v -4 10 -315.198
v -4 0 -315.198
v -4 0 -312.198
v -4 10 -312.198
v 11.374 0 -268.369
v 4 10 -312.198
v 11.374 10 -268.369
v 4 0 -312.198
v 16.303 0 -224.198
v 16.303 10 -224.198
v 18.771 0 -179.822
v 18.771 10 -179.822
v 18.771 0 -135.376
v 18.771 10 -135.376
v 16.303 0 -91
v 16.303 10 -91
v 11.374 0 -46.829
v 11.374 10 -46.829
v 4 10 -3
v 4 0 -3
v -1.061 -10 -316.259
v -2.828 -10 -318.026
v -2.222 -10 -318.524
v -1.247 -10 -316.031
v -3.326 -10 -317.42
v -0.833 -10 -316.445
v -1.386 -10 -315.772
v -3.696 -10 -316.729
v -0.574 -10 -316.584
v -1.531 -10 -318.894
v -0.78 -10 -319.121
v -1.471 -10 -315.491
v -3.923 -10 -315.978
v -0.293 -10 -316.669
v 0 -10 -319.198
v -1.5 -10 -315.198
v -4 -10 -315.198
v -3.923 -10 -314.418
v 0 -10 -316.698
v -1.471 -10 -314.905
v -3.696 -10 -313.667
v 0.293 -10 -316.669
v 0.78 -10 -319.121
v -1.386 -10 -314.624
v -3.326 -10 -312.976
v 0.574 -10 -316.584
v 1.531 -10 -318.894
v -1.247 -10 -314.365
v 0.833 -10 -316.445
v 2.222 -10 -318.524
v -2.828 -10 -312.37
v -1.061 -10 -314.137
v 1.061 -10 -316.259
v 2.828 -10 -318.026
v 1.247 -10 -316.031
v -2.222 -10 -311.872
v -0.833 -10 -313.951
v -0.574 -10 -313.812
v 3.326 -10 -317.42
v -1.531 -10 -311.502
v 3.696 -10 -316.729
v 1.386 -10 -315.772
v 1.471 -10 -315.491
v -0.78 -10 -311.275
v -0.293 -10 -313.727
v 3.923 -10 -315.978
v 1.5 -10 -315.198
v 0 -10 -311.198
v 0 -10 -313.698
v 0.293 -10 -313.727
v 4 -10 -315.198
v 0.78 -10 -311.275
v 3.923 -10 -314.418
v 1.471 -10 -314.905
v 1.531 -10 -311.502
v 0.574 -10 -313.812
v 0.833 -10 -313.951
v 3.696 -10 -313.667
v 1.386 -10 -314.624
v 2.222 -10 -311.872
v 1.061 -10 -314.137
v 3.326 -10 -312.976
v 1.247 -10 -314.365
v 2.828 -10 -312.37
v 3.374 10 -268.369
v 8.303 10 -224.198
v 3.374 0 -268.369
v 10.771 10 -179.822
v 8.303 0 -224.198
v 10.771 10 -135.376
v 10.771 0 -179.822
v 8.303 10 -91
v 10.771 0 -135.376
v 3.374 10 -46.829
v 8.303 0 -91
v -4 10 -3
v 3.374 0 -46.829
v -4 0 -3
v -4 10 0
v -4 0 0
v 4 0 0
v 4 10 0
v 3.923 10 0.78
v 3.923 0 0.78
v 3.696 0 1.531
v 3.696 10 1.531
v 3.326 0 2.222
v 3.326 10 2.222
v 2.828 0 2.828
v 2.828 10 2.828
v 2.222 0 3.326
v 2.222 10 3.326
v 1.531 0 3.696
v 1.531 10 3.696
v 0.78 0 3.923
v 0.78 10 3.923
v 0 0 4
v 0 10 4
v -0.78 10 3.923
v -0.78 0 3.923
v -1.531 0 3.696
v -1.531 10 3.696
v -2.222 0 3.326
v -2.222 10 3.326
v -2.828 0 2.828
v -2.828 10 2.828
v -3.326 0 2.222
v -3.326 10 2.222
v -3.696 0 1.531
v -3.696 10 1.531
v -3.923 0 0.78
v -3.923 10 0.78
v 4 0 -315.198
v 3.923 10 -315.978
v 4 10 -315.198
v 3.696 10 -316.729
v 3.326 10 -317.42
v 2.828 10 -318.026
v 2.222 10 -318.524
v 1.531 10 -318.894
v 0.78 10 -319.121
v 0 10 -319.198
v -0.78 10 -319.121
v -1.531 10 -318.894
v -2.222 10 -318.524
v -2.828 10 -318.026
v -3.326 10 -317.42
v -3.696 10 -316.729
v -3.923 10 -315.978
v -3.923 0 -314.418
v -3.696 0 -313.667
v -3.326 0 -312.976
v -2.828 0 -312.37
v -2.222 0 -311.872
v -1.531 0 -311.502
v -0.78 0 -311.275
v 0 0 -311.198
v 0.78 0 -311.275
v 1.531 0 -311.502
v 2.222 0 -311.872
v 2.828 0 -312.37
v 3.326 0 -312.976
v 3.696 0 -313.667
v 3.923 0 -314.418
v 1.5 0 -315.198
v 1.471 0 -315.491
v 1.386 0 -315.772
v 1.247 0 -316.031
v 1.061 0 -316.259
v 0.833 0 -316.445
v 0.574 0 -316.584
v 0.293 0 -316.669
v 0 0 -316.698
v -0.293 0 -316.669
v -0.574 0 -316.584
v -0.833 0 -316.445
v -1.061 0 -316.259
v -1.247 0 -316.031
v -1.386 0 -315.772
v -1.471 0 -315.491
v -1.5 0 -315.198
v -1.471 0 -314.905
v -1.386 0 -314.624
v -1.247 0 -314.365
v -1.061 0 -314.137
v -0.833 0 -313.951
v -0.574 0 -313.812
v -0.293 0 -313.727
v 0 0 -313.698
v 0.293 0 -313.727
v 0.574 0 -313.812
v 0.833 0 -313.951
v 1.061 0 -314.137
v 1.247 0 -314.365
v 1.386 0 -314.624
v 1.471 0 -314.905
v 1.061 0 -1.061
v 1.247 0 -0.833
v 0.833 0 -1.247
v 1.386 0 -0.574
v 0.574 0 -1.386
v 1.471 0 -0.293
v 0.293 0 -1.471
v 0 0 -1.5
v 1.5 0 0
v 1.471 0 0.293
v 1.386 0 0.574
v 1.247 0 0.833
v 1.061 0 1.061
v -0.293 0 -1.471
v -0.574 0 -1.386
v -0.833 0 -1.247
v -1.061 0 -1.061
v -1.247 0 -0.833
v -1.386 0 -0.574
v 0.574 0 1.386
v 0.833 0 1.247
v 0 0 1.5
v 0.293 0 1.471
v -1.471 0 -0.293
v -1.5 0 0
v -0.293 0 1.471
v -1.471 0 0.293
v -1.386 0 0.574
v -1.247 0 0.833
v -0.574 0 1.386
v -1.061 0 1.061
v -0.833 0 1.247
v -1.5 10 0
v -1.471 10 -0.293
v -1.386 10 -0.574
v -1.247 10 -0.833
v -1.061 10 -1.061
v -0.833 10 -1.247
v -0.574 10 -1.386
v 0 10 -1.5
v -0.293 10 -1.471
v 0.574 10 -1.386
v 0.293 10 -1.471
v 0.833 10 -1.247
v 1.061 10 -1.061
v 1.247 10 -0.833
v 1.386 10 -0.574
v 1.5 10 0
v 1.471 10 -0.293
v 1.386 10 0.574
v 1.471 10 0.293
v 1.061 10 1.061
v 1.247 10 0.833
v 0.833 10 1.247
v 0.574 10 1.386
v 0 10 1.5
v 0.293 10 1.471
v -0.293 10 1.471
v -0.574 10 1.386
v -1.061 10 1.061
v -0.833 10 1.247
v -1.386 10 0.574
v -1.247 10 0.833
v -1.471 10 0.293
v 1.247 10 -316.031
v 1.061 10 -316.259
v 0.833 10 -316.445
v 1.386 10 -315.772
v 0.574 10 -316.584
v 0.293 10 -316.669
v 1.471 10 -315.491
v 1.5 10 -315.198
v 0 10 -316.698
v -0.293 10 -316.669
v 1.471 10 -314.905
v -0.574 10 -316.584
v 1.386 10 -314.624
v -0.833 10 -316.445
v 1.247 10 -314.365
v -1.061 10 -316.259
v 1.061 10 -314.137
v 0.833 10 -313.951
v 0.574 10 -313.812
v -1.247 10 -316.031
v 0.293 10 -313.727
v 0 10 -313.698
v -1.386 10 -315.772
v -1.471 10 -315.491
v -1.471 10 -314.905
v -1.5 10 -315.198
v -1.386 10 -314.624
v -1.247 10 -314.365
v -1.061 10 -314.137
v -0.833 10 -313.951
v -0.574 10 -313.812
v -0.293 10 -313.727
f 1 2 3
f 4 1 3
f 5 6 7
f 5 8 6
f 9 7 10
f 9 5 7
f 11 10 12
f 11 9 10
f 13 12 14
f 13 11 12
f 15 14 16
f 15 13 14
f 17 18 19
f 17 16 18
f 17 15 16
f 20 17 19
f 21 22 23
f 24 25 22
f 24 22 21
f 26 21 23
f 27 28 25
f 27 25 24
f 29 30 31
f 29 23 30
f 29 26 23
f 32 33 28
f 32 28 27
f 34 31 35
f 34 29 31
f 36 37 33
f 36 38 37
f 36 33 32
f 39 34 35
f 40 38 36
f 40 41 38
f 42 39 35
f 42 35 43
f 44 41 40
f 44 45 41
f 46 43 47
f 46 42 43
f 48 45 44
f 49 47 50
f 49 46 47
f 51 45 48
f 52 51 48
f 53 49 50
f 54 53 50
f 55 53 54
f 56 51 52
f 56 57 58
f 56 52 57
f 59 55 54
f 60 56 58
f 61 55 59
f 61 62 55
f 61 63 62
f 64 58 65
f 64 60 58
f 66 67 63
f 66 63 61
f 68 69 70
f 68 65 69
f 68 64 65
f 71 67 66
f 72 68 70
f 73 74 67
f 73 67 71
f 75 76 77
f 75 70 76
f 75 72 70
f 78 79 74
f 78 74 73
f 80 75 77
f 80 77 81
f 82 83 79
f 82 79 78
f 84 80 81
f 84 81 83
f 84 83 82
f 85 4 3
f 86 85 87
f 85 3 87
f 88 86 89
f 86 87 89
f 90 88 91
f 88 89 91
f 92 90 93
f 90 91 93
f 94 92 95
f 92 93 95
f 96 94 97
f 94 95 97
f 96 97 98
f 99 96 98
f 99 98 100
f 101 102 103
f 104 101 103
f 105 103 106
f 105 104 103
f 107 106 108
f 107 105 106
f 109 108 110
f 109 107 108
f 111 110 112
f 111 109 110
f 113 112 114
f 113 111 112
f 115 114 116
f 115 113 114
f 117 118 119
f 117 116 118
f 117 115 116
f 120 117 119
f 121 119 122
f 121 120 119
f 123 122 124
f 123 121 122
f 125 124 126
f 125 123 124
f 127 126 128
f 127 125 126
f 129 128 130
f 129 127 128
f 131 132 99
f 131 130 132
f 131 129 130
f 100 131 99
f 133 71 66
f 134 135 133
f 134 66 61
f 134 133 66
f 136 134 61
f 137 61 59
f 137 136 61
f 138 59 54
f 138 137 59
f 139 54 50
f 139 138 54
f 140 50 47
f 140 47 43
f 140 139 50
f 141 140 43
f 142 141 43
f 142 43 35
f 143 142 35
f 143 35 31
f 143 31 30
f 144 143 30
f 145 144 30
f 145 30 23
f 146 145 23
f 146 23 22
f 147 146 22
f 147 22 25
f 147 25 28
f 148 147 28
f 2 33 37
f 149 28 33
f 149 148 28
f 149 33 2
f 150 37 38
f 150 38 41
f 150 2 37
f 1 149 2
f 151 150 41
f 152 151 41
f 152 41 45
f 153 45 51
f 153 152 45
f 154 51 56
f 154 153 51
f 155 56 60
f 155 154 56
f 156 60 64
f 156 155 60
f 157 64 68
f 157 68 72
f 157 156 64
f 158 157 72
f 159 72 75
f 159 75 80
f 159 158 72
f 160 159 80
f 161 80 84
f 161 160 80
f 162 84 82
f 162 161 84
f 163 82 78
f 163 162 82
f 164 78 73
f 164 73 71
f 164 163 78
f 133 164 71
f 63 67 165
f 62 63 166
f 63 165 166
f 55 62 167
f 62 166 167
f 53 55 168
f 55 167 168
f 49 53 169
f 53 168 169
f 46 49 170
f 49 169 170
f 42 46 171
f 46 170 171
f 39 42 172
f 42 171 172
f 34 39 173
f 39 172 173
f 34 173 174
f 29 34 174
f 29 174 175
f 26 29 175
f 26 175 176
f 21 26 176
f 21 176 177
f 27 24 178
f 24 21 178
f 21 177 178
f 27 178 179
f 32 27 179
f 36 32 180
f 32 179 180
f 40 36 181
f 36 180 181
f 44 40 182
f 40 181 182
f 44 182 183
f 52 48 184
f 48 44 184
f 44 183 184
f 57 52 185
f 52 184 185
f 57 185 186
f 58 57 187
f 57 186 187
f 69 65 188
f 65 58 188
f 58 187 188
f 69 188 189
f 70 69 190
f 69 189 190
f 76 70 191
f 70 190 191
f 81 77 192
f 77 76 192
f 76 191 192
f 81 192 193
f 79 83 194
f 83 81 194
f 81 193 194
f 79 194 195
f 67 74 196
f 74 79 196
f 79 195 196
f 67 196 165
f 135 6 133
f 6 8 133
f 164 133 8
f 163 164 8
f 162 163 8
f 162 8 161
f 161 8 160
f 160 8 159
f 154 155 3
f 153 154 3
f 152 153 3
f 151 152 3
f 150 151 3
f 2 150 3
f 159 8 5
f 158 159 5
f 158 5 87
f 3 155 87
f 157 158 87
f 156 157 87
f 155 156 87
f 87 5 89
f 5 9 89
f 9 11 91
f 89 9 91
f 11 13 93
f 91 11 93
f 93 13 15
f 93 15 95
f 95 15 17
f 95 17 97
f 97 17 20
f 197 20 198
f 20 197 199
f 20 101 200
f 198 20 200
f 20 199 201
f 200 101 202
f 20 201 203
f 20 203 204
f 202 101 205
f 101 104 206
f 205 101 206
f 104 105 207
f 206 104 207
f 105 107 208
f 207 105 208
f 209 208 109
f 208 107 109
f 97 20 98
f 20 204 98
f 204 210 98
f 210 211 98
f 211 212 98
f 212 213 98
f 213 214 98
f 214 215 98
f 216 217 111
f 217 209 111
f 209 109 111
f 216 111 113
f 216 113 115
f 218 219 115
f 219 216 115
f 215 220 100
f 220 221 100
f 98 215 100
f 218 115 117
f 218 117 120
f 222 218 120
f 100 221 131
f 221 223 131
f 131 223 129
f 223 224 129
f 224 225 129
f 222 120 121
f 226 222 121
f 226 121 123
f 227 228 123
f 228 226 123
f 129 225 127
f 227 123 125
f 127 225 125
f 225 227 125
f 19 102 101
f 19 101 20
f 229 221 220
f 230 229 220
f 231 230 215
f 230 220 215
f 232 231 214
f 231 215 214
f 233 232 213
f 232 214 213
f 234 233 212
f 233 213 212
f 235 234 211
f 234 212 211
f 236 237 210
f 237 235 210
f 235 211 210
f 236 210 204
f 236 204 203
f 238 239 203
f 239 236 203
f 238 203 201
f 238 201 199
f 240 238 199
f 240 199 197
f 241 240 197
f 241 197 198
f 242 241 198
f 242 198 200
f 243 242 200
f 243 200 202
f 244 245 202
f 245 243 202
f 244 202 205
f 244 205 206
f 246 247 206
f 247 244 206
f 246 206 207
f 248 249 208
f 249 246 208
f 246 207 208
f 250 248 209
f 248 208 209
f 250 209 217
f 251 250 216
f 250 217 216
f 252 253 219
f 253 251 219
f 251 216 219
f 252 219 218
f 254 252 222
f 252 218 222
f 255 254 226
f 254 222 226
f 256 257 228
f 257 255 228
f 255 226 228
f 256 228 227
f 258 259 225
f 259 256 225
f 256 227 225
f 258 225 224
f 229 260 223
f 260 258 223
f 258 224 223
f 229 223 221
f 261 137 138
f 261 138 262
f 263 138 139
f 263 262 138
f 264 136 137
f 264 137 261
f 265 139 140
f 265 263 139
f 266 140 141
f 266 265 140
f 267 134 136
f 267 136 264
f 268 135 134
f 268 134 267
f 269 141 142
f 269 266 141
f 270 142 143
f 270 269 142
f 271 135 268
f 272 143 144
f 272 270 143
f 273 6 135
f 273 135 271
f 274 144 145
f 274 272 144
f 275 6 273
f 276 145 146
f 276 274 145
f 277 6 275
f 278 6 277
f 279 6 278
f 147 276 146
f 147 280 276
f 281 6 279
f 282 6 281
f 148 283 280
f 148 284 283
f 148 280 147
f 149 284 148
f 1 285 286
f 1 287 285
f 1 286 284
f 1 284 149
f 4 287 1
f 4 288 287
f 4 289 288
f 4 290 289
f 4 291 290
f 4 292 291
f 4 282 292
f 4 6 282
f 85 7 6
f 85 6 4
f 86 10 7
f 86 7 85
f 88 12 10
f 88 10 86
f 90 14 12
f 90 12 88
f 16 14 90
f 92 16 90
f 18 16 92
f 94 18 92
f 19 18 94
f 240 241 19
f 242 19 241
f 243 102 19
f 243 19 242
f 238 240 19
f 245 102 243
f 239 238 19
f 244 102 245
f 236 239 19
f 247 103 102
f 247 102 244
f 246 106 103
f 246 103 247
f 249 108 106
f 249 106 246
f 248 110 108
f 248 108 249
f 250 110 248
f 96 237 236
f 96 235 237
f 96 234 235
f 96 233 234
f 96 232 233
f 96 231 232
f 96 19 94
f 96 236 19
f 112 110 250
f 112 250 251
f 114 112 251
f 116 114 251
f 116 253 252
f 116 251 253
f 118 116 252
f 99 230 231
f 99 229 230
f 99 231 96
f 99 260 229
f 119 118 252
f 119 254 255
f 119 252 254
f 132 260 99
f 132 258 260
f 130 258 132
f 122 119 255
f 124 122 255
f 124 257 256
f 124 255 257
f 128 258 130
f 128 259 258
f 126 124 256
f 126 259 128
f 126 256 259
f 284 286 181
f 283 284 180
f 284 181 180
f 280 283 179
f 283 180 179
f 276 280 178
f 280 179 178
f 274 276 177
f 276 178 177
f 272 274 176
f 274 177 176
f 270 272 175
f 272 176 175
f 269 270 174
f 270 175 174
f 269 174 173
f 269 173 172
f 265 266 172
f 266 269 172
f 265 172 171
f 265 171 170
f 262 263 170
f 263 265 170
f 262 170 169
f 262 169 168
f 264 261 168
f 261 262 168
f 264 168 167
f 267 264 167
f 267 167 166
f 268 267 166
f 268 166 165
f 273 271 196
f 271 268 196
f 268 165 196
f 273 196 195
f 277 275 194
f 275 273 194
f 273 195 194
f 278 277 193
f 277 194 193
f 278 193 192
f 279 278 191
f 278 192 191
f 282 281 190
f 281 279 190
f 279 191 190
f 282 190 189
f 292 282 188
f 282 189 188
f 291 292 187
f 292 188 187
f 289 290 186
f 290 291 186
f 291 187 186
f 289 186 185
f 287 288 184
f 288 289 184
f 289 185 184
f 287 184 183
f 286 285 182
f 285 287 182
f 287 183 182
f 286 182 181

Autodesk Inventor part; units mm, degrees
ref_plane "YZ Plane" through (0, 0, 0) normal (1, 0, 0) x (0, 1, 0)
ref_plane "XZ Plane" through (0, 0, 0) normal (0, 1, 0) x (-1, 0, 0)
ref_plane "XY Plane" through (0, 0, 0) normal (0, 0, 1) x (1, 0, 0)
sketch "Sketch1" plane through (0, 0, 0) normal (0, 1, 0) x (-1, 0, 0)
  line L0 (0, 0) -> (0, -315.198) construction
  line L1 (-4, 0) -> (-4, -315.198)
  line L2 (4, -315.198) -> (4, 0)
  arc A0 (4, 0) -> (-4, 0) centre (0, 0) ccw
  arc A1 (-4, -315.198) -> (4, -315.198) centre (0, -315.198) ccw
  circle A2 centre (0, 0) radius 1.5
  circle A3 centre (0, -315.198) radius 1.5
  arc A4 (-4, -3) -> (-4, -312.198) centre (780.9198, -157.599) ccw
  arc A5 (4, -3) -> (4, -312.198) centre (788.9198, -157.599) ccw
  point P0 (0, -157.599)
  dimension "d0" = 8
  dimension "d1" = 315.198
  dimension "d2" = 3
  dimension "d3" = 3
  dimension "d24" = 800
  dimension "d25" = 800
  dimension "d26" = 3
  dimension "d27" = 3
extrude "Extrusion1" add sketch "Sketch1" along normal blind 10 contours A0 L2 A5 L1 | L1 A5 A4 | L1 A5 L2 A1
sketch "Sketch4" plane through (0, 0, 0) normal (0, -1, 0) x (1, 0, 0)
  line L0 (-4, -315.198) -> (-4, -312.198) projected
  arc A0 (-4, -315.198) -> (4, -315.198) centre (0, -315.198) ccw projected
  line L1 (4, -312.198) -> (4, -315.198) projected
  arc A1 (4, -312.198) -> (4, -3) centre (-780.9198, -157.599) ccw projected
  line L2 (4, 0) -> (4, -3) projected
  arc A2 (4, 0) -> (-4, 0) centre (0, 0) ccw projected
  line L3 (-4, -3) -> (-4, 0) projected
  arc A3 (-4, -312.198) -> (-4, -3) centre (-788.9198, -157.599) ccw projected
  circle A4 centre (0, 0) radius 1.5 projected
  circle A5 centre (0, -315.198) radius 1.5 projected
  circle A6 centre (0, -315.198) radius 4
  point P0 (4, -315.198)
extrude "Extrusion3" add sketch "Sketch4" along normal blind 10 contours A6 A0
sketch "Sketch3" plane through (0, 10, 0) normal (0, 1, 0) x (1, 0, 0)
  line L0 (-4, 315.198) -> (-4, 312.198) projected
  arc A0 (-4, 3) -> (-4, 312.198) centre (-788.9198, 157.599) ccw projected
  line L1 (-4, 3) -> (-4, 0) projected
  arc A1 (-4, 0) -> (4, 0) centre (0, 0) ccw projected
  line L2 (4, 0) -> (4, 3) projected
  arc A2 (4, 3) -> (4, 312.198) centre (-780.9198, 157.599) ccw projected
  line L3 (4, 312.198) -> (4, 315.198) projected
  arc A3 (4, 315.198) -> (-4, 315.198) centre (0, 315.198) ccw projected
  circle A4 centre (0, 0) radius 1.5 projected
  circle A5 centre (0, 315.198) radius 1.5 projected
  arc A6 (-4, 3) -> (-4, 312.198) centre (-788.9198, 157.599) ccw projected
  line L4 (11.0802, 157.599) -> (14.7286, 165.8884)
  line L5 (14.7286, 165.8884) -> (19.0802, 157.599)
  arc A7 (4, 3) -> (4, 312.198) centre (-780.9198, 157.599) ccw projected
extrude "Extrusion2" [suppressed]
